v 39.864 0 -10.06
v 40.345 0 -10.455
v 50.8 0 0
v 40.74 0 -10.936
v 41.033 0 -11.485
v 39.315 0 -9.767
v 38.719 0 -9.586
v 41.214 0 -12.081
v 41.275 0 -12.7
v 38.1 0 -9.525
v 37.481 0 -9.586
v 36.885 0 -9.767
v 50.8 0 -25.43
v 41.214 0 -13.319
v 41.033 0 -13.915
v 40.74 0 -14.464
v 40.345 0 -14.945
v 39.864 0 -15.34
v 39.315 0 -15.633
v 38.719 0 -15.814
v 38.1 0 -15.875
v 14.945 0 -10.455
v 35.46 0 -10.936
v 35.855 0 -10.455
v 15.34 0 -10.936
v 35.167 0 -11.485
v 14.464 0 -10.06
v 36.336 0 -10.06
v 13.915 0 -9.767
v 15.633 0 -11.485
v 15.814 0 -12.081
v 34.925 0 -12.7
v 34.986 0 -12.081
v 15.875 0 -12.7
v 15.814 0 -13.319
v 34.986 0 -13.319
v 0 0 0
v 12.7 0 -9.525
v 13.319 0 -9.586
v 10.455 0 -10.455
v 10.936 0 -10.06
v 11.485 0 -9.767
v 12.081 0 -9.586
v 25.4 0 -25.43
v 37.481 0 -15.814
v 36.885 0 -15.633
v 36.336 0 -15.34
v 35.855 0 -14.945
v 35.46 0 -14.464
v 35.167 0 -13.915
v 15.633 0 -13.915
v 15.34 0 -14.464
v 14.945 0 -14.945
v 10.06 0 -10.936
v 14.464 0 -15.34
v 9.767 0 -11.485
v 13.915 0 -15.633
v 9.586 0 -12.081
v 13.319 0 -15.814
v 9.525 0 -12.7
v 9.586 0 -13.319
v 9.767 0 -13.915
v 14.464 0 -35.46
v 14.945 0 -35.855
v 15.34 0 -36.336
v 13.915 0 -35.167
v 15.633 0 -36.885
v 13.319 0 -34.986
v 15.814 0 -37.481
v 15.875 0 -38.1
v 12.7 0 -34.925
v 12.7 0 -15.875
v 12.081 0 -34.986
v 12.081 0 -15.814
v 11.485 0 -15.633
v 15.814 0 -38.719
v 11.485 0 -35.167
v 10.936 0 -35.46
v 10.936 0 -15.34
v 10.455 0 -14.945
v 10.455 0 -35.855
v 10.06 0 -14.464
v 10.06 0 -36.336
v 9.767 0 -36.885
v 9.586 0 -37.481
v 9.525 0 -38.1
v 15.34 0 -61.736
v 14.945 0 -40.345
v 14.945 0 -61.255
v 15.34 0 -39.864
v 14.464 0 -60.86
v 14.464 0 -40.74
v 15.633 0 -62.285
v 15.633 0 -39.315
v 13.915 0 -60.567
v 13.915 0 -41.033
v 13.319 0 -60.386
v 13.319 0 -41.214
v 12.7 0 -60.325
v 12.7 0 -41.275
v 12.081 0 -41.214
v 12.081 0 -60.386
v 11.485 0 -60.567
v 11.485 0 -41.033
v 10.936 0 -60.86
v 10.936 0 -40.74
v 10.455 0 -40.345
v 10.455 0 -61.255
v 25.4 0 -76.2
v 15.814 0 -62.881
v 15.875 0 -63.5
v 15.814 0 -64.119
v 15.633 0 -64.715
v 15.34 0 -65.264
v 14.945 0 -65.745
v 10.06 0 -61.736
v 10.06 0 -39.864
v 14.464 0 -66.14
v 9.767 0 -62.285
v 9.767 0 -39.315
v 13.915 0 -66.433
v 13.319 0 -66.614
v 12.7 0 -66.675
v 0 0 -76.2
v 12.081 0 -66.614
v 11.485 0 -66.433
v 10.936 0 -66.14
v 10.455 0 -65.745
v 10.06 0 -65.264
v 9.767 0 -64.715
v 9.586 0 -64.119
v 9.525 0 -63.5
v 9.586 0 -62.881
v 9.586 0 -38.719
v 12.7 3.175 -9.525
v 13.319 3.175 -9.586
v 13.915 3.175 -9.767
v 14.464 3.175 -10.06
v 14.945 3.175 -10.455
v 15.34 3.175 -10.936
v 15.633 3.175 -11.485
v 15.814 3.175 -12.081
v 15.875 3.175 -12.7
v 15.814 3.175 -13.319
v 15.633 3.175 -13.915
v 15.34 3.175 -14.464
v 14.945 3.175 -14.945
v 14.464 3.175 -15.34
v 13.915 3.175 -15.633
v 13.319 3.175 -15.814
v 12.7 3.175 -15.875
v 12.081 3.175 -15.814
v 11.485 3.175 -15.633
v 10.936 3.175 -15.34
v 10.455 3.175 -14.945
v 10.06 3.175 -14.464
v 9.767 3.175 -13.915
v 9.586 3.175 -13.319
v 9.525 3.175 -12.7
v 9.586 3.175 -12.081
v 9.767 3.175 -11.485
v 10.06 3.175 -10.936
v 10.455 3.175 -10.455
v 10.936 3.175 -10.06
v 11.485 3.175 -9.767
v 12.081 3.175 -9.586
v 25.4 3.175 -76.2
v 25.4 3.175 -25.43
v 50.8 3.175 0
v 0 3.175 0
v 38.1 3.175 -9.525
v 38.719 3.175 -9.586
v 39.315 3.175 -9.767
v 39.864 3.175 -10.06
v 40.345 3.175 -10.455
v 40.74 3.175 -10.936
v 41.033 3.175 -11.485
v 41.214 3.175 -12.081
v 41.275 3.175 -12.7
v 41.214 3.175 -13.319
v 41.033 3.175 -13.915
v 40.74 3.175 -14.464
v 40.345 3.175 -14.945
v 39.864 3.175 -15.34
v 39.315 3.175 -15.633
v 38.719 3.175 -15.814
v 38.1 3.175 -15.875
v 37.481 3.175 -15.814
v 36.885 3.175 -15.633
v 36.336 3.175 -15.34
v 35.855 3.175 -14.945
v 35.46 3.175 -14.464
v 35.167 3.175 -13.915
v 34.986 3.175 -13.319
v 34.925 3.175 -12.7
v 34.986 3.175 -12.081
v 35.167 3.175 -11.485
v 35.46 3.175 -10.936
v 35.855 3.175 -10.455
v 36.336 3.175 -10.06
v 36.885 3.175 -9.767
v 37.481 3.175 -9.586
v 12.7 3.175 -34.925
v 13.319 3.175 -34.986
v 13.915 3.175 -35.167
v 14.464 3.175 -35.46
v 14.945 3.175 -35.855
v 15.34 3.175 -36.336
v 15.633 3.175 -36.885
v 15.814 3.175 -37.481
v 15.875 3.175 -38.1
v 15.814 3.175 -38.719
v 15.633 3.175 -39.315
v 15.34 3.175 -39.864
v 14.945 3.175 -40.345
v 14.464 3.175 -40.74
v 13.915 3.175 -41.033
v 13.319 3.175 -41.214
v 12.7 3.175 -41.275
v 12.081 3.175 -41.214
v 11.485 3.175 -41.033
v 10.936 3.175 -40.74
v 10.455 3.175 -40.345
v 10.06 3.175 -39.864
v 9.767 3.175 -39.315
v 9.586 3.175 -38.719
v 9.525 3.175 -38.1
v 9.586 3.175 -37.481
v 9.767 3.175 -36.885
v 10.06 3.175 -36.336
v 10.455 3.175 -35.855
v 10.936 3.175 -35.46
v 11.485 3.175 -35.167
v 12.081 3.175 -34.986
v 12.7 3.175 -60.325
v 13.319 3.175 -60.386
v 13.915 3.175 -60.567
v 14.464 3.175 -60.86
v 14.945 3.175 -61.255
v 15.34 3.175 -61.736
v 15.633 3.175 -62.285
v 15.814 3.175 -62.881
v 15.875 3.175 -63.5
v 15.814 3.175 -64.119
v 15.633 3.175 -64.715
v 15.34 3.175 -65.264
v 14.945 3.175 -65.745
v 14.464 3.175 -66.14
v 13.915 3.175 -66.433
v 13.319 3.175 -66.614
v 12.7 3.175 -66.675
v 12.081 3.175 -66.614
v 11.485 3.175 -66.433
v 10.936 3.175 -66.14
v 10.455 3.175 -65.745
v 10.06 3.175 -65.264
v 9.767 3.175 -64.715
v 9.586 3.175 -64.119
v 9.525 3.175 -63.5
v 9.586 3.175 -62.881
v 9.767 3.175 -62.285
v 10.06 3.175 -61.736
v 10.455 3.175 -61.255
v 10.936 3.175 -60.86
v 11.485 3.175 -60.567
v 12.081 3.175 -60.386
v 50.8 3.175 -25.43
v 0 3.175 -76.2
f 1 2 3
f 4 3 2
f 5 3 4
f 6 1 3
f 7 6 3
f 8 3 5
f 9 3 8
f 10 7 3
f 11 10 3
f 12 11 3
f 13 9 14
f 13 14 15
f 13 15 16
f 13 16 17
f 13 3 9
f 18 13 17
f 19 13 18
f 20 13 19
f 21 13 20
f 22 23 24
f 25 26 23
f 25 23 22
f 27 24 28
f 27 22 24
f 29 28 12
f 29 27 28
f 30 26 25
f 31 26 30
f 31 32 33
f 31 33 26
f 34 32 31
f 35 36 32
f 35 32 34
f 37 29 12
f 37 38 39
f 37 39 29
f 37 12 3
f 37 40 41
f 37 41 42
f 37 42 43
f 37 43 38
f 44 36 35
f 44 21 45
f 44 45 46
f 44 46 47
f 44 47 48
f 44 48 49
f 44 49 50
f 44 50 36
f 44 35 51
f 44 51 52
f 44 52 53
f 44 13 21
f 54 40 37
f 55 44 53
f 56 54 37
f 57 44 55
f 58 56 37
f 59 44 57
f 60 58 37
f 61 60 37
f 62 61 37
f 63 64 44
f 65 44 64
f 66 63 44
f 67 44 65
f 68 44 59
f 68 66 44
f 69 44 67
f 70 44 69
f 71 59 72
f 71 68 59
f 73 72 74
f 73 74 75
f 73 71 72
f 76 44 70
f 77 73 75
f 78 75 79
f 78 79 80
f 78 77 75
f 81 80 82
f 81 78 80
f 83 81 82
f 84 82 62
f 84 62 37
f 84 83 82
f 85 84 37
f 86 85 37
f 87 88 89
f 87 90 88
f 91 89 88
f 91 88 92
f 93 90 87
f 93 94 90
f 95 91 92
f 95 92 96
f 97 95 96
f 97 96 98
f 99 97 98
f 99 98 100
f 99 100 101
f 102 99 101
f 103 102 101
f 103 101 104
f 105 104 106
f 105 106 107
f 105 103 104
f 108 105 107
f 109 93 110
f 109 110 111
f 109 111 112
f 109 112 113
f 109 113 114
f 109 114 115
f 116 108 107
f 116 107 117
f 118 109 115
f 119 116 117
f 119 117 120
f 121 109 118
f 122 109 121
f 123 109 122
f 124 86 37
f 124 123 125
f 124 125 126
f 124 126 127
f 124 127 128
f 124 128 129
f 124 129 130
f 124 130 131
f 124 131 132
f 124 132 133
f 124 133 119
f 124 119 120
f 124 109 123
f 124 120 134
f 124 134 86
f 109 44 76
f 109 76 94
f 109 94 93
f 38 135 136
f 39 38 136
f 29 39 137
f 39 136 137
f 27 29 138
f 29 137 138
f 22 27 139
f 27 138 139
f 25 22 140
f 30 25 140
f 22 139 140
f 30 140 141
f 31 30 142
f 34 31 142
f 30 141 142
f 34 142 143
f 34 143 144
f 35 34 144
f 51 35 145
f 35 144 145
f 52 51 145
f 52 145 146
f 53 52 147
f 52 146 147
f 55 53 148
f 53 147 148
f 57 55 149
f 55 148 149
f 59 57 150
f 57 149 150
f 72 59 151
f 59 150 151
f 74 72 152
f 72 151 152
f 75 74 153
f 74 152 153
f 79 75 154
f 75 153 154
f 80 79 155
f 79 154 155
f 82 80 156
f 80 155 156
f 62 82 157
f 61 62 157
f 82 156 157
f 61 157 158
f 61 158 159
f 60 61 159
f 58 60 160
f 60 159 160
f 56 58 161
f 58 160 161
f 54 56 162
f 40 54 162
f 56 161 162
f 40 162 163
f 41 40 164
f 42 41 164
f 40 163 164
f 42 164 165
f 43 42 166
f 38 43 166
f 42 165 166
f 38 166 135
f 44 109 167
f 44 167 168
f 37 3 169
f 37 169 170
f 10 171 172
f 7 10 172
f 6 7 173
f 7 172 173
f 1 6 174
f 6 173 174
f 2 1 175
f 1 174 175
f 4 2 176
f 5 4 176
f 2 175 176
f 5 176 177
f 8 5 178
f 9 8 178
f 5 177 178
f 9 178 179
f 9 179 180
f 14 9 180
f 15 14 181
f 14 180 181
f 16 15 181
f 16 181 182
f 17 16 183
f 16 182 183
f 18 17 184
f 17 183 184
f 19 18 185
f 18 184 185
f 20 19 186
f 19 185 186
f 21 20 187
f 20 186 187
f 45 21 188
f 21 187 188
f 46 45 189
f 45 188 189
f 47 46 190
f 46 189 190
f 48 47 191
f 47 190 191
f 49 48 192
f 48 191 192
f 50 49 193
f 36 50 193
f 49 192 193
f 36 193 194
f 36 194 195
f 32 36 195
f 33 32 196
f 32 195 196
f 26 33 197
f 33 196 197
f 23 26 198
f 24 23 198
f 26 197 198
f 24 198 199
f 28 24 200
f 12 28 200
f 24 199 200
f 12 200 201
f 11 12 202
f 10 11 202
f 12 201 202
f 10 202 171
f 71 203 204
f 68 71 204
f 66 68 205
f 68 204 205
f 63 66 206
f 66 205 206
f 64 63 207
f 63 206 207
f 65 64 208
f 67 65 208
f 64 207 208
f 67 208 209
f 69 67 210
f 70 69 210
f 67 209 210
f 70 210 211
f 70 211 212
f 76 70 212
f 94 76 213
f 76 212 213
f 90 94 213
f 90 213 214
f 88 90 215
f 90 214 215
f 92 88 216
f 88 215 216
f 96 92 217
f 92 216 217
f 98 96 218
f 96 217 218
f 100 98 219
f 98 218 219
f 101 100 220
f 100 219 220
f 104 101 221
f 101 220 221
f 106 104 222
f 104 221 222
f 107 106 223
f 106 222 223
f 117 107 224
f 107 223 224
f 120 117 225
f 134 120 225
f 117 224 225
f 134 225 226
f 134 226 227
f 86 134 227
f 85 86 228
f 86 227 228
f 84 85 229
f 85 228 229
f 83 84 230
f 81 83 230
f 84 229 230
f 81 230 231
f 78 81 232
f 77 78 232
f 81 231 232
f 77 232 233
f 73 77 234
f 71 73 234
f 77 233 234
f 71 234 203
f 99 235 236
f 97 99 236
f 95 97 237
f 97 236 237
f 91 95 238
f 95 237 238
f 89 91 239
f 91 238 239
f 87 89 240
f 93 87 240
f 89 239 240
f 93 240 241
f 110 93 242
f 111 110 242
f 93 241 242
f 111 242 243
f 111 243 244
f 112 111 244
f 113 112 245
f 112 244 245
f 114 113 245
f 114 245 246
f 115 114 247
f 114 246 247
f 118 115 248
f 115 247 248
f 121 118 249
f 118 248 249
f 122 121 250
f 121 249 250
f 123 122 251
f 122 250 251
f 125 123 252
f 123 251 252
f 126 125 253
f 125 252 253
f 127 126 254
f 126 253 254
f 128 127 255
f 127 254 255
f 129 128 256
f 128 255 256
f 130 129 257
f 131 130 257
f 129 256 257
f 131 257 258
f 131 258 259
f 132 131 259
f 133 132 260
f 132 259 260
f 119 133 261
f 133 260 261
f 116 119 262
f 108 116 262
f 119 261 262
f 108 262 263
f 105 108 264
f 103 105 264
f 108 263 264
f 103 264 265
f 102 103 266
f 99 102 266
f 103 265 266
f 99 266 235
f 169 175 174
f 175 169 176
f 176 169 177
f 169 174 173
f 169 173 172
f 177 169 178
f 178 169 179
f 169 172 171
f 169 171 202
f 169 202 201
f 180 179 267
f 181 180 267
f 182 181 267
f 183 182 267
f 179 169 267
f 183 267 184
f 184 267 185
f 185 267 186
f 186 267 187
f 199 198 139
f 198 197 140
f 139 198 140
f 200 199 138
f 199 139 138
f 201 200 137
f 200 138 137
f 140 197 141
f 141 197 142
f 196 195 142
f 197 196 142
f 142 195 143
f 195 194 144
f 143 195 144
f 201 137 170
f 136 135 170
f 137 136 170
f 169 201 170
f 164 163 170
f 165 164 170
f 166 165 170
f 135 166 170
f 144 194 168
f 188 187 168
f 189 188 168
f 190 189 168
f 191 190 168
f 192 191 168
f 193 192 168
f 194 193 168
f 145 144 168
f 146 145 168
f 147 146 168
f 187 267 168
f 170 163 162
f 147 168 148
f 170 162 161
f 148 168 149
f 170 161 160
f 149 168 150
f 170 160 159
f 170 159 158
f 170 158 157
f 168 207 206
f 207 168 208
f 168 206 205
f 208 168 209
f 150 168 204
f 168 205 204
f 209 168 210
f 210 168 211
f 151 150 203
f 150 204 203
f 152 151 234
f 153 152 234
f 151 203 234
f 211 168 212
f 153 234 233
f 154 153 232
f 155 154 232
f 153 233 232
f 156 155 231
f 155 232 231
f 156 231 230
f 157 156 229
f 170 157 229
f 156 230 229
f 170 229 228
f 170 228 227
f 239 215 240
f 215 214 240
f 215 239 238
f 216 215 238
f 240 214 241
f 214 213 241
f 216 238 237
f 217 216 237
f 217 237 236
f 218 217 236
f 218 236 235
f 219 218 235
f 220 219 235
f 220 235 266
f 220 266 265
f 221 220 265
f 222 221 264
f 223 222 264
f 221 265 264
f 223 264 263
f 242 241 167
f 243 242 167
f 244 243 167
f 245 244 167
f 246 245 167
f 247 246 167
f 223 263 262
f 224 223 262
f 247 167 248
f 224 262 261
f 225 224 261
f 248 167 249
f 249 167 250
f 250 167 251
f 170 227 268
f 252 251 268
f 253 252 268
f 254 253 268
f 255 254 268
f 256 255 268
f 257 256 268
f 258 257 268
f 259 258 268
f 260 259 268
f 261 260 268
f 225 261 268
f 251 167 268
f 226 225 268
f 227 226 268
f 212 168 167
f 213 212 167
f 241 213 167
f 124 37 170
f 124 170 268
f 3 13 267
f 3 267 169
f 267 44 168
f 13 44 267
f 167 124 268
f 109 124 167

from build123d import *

# Parameters (mm, degrees)
BOSS_EXTRUDE1_DEPTH = 3.175
SKETCH2_R           = 3.175
CUT_EXTRUDE1_DEPTH  = 3.175
LPATTERN1_COUNT     = 3
LPATTERN1_PITCH     = 25.4
LPATTERN2_COUNT     = 2
LPATTERN2_PITCH     = 25.4


with BuildPart() as part:
    # Sketch1 → Boss-Extrude1 (new body)
    with BuildSketch(Plane(origin=(0, 0, 0), x_dir=(1, 0, 0), z_dir=(0, 1, 0))):
        Polygon((0, 0), (0, 76.2), (25.4, 76.2), (25.4, 25.429586946), (50.8, 25.429586946), (50.8, 0), align=None)
    extrude(amount=BOSS_EXTRUDE1_DEPTH)

    # Sketch2 → Cut-Extrude1 (cut)
    with BuildSketch(Plane(origin=(0, 3.175, 0), x_dir=(1, 0, 0), z_dir=(0, 1, 0))):
        with Locations(Location((12.7, 12.7, 0), (0, 0, 270))):
            Circle(SKETCH2_R)
    cut_extrude1 = extrude(amount=-CUT_EXTRUDE1_DEPTH, mode=Mode.SUBTRACT)

    # LPattern1: Cut-Extrude1 ×3
    with Locations(*[(0, 0, -i * LPATTERN1_PITCH) for i in range(1, LPATTERN1_COUNT)]):
        add(cut_extrude1, mode=Mode.SUBTRACT)

    # LPattern2: Cut-Extrude1 ×2
    with Locations(*[(i * LPATTERN2_PITCH, 0, 0) for i in range(1, LPATTERN2_COUNT)]):
        add(cut_extrude1, mode=Mode.SUBTRACT)


solid = part.part
